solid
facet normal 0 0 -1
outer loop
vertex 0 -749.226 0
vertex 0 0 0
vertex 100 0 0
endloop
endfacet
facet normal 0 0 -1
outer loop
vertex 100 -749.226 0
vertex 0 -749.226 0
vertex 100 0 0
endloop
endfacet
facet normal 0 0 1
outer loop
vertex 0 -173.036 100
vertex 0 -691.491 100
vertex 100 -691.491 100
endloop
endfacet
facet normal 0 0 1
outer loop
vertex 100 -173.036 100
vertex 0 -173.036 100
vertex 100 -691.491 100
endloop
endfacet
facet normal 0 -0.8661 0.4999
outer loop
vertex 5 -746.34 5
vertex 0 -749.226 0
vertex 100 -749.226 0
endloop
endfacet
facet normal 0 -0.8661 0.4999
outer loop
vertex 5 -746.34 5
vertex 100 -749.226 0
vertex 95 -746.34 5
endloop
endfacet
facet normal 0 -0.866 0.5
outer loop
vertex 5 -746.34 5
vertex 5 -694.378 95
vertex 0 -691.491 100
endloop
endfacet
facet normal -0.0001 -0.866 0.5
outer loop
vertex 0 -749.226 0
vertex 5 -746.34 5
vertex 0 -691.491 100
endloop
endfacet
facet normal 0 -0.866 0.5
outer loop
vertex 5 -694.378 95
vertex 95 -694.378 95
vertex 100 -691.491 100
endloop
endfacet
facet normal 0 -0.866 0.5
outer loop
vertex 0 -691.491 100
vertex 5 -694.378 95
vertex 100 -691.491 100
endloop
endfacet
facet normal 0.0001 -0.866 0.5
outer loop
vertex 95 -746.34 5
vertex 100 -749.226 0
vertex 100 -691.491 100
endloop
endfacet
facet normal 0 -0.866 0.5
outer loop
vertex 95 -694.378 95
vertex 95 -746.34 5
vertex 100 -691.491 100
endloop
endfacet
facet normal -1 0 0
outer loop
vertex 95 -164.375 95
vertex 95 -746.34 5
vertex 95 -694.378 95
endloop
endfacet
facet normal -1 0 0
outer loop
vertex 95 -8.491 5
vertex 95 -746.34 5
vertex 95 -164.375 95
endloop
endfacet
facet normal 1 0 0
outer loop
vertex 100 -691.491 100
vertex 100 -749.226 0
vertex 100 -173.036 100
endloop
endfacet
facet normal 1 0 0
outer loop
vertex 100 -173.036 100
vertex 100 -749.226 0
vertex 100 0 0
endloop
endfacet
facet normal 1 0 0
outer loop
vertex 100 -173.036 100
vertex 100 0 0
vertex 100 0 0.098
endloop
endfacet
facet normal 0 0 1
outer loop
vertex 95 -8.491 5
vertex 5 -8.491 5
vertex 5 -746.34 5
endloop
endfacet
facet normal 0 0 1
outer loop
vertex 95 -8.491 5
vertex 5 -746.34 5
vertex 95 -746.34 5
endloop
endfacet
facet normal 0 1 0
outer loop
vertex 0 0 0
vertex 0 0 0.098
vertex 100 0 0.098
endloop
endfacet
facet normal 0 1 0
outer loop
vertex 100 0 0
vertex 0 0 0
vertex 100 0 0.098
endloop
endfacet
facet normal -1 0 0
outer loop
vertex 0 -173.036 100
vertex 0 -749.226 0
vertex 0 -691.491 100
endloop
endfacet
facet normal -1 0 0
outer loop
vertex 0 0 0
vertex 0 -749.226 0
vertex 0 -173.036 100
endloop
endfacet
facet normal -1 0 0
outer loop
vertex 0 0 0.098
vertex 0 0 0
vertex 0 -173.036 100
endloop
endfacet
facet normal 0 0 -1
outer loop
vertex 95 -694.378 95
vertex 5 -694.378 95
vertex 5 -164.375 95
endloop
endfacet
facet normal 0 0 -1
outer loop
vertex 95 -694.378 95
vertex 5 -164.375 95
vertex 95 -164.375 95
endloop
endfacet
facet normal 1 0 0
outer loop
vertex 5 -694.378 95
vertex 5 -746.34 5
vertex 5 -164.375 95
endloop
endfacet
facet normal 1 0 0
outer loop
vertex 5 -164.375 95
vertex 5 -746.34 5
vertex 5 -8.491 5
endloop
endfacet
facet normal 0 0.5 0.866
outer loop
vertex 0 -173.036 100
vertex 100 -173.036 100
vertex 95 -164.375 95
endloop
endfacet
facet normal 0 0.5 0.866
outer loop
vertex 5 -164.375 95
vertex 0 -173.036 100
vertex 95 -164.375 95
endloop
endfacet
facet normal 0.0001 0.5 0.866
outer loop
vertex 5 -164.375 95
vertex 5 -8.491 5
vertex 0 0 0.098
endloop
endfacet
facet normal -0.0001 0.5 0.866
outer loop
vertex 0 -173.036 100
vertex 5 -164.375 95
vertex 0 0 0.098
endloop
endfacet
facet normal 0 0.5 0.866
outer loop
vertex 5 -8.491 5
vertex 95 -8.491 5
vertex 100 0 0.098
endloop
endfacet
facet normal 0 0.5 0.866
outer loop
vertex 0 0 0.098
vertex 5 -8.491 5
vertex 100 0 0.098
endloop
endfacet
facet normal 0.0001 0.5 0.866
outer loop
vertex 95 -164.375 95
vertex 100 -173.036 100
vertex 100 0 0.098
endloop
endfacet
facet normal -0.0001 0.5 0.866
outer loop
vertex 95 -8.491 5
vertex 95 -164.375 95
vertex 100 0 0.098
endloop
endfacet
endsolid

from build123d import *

# Parameters (mm, degrees)
F0_W     = 100
F0_H     = 100
F0_W_2   = 90
F0_H_2   = 90
F1_DEPTH = 750
F3_DEPTH = 100.001
F5_DEPTH = 100.001


with BuildPart() as f1:
    # F0 (on Front) → F1 (new body)
    with BuildSketch(Plane.XZ):
        with Locations((50, 50)):
            Rectangle(F0_W, F0_H)
        with Locations((50, 50)):
            Rectangle(F0_W_2, F0_H_2, mode=Mode.SUBTRACT)
    extrude(amount=F1_DEPTH)

    # F2 (on face) → F3 (cut, through all)
    with BuildSketch(Plane.YZ.offset(100)):
        Polygon((-679.944465, 120), (-755, 120), (-755, -10), align=None)
    extrude(amount=-F3_DEPTH, mode=Mode.SUBTRACT)

    # F4 (on face) → F5 (cut, through all)
    with BuildSketch(Plane.YZ.offset(100)):
        Polygon((0.141252, 114.146464), (-197.538123, 114.146464), (0.141252, 0.016223), align=None)
    extrude(amount=-F5_DEPTH, mode=Mode.SUBTRACT)


solid = f1.part
